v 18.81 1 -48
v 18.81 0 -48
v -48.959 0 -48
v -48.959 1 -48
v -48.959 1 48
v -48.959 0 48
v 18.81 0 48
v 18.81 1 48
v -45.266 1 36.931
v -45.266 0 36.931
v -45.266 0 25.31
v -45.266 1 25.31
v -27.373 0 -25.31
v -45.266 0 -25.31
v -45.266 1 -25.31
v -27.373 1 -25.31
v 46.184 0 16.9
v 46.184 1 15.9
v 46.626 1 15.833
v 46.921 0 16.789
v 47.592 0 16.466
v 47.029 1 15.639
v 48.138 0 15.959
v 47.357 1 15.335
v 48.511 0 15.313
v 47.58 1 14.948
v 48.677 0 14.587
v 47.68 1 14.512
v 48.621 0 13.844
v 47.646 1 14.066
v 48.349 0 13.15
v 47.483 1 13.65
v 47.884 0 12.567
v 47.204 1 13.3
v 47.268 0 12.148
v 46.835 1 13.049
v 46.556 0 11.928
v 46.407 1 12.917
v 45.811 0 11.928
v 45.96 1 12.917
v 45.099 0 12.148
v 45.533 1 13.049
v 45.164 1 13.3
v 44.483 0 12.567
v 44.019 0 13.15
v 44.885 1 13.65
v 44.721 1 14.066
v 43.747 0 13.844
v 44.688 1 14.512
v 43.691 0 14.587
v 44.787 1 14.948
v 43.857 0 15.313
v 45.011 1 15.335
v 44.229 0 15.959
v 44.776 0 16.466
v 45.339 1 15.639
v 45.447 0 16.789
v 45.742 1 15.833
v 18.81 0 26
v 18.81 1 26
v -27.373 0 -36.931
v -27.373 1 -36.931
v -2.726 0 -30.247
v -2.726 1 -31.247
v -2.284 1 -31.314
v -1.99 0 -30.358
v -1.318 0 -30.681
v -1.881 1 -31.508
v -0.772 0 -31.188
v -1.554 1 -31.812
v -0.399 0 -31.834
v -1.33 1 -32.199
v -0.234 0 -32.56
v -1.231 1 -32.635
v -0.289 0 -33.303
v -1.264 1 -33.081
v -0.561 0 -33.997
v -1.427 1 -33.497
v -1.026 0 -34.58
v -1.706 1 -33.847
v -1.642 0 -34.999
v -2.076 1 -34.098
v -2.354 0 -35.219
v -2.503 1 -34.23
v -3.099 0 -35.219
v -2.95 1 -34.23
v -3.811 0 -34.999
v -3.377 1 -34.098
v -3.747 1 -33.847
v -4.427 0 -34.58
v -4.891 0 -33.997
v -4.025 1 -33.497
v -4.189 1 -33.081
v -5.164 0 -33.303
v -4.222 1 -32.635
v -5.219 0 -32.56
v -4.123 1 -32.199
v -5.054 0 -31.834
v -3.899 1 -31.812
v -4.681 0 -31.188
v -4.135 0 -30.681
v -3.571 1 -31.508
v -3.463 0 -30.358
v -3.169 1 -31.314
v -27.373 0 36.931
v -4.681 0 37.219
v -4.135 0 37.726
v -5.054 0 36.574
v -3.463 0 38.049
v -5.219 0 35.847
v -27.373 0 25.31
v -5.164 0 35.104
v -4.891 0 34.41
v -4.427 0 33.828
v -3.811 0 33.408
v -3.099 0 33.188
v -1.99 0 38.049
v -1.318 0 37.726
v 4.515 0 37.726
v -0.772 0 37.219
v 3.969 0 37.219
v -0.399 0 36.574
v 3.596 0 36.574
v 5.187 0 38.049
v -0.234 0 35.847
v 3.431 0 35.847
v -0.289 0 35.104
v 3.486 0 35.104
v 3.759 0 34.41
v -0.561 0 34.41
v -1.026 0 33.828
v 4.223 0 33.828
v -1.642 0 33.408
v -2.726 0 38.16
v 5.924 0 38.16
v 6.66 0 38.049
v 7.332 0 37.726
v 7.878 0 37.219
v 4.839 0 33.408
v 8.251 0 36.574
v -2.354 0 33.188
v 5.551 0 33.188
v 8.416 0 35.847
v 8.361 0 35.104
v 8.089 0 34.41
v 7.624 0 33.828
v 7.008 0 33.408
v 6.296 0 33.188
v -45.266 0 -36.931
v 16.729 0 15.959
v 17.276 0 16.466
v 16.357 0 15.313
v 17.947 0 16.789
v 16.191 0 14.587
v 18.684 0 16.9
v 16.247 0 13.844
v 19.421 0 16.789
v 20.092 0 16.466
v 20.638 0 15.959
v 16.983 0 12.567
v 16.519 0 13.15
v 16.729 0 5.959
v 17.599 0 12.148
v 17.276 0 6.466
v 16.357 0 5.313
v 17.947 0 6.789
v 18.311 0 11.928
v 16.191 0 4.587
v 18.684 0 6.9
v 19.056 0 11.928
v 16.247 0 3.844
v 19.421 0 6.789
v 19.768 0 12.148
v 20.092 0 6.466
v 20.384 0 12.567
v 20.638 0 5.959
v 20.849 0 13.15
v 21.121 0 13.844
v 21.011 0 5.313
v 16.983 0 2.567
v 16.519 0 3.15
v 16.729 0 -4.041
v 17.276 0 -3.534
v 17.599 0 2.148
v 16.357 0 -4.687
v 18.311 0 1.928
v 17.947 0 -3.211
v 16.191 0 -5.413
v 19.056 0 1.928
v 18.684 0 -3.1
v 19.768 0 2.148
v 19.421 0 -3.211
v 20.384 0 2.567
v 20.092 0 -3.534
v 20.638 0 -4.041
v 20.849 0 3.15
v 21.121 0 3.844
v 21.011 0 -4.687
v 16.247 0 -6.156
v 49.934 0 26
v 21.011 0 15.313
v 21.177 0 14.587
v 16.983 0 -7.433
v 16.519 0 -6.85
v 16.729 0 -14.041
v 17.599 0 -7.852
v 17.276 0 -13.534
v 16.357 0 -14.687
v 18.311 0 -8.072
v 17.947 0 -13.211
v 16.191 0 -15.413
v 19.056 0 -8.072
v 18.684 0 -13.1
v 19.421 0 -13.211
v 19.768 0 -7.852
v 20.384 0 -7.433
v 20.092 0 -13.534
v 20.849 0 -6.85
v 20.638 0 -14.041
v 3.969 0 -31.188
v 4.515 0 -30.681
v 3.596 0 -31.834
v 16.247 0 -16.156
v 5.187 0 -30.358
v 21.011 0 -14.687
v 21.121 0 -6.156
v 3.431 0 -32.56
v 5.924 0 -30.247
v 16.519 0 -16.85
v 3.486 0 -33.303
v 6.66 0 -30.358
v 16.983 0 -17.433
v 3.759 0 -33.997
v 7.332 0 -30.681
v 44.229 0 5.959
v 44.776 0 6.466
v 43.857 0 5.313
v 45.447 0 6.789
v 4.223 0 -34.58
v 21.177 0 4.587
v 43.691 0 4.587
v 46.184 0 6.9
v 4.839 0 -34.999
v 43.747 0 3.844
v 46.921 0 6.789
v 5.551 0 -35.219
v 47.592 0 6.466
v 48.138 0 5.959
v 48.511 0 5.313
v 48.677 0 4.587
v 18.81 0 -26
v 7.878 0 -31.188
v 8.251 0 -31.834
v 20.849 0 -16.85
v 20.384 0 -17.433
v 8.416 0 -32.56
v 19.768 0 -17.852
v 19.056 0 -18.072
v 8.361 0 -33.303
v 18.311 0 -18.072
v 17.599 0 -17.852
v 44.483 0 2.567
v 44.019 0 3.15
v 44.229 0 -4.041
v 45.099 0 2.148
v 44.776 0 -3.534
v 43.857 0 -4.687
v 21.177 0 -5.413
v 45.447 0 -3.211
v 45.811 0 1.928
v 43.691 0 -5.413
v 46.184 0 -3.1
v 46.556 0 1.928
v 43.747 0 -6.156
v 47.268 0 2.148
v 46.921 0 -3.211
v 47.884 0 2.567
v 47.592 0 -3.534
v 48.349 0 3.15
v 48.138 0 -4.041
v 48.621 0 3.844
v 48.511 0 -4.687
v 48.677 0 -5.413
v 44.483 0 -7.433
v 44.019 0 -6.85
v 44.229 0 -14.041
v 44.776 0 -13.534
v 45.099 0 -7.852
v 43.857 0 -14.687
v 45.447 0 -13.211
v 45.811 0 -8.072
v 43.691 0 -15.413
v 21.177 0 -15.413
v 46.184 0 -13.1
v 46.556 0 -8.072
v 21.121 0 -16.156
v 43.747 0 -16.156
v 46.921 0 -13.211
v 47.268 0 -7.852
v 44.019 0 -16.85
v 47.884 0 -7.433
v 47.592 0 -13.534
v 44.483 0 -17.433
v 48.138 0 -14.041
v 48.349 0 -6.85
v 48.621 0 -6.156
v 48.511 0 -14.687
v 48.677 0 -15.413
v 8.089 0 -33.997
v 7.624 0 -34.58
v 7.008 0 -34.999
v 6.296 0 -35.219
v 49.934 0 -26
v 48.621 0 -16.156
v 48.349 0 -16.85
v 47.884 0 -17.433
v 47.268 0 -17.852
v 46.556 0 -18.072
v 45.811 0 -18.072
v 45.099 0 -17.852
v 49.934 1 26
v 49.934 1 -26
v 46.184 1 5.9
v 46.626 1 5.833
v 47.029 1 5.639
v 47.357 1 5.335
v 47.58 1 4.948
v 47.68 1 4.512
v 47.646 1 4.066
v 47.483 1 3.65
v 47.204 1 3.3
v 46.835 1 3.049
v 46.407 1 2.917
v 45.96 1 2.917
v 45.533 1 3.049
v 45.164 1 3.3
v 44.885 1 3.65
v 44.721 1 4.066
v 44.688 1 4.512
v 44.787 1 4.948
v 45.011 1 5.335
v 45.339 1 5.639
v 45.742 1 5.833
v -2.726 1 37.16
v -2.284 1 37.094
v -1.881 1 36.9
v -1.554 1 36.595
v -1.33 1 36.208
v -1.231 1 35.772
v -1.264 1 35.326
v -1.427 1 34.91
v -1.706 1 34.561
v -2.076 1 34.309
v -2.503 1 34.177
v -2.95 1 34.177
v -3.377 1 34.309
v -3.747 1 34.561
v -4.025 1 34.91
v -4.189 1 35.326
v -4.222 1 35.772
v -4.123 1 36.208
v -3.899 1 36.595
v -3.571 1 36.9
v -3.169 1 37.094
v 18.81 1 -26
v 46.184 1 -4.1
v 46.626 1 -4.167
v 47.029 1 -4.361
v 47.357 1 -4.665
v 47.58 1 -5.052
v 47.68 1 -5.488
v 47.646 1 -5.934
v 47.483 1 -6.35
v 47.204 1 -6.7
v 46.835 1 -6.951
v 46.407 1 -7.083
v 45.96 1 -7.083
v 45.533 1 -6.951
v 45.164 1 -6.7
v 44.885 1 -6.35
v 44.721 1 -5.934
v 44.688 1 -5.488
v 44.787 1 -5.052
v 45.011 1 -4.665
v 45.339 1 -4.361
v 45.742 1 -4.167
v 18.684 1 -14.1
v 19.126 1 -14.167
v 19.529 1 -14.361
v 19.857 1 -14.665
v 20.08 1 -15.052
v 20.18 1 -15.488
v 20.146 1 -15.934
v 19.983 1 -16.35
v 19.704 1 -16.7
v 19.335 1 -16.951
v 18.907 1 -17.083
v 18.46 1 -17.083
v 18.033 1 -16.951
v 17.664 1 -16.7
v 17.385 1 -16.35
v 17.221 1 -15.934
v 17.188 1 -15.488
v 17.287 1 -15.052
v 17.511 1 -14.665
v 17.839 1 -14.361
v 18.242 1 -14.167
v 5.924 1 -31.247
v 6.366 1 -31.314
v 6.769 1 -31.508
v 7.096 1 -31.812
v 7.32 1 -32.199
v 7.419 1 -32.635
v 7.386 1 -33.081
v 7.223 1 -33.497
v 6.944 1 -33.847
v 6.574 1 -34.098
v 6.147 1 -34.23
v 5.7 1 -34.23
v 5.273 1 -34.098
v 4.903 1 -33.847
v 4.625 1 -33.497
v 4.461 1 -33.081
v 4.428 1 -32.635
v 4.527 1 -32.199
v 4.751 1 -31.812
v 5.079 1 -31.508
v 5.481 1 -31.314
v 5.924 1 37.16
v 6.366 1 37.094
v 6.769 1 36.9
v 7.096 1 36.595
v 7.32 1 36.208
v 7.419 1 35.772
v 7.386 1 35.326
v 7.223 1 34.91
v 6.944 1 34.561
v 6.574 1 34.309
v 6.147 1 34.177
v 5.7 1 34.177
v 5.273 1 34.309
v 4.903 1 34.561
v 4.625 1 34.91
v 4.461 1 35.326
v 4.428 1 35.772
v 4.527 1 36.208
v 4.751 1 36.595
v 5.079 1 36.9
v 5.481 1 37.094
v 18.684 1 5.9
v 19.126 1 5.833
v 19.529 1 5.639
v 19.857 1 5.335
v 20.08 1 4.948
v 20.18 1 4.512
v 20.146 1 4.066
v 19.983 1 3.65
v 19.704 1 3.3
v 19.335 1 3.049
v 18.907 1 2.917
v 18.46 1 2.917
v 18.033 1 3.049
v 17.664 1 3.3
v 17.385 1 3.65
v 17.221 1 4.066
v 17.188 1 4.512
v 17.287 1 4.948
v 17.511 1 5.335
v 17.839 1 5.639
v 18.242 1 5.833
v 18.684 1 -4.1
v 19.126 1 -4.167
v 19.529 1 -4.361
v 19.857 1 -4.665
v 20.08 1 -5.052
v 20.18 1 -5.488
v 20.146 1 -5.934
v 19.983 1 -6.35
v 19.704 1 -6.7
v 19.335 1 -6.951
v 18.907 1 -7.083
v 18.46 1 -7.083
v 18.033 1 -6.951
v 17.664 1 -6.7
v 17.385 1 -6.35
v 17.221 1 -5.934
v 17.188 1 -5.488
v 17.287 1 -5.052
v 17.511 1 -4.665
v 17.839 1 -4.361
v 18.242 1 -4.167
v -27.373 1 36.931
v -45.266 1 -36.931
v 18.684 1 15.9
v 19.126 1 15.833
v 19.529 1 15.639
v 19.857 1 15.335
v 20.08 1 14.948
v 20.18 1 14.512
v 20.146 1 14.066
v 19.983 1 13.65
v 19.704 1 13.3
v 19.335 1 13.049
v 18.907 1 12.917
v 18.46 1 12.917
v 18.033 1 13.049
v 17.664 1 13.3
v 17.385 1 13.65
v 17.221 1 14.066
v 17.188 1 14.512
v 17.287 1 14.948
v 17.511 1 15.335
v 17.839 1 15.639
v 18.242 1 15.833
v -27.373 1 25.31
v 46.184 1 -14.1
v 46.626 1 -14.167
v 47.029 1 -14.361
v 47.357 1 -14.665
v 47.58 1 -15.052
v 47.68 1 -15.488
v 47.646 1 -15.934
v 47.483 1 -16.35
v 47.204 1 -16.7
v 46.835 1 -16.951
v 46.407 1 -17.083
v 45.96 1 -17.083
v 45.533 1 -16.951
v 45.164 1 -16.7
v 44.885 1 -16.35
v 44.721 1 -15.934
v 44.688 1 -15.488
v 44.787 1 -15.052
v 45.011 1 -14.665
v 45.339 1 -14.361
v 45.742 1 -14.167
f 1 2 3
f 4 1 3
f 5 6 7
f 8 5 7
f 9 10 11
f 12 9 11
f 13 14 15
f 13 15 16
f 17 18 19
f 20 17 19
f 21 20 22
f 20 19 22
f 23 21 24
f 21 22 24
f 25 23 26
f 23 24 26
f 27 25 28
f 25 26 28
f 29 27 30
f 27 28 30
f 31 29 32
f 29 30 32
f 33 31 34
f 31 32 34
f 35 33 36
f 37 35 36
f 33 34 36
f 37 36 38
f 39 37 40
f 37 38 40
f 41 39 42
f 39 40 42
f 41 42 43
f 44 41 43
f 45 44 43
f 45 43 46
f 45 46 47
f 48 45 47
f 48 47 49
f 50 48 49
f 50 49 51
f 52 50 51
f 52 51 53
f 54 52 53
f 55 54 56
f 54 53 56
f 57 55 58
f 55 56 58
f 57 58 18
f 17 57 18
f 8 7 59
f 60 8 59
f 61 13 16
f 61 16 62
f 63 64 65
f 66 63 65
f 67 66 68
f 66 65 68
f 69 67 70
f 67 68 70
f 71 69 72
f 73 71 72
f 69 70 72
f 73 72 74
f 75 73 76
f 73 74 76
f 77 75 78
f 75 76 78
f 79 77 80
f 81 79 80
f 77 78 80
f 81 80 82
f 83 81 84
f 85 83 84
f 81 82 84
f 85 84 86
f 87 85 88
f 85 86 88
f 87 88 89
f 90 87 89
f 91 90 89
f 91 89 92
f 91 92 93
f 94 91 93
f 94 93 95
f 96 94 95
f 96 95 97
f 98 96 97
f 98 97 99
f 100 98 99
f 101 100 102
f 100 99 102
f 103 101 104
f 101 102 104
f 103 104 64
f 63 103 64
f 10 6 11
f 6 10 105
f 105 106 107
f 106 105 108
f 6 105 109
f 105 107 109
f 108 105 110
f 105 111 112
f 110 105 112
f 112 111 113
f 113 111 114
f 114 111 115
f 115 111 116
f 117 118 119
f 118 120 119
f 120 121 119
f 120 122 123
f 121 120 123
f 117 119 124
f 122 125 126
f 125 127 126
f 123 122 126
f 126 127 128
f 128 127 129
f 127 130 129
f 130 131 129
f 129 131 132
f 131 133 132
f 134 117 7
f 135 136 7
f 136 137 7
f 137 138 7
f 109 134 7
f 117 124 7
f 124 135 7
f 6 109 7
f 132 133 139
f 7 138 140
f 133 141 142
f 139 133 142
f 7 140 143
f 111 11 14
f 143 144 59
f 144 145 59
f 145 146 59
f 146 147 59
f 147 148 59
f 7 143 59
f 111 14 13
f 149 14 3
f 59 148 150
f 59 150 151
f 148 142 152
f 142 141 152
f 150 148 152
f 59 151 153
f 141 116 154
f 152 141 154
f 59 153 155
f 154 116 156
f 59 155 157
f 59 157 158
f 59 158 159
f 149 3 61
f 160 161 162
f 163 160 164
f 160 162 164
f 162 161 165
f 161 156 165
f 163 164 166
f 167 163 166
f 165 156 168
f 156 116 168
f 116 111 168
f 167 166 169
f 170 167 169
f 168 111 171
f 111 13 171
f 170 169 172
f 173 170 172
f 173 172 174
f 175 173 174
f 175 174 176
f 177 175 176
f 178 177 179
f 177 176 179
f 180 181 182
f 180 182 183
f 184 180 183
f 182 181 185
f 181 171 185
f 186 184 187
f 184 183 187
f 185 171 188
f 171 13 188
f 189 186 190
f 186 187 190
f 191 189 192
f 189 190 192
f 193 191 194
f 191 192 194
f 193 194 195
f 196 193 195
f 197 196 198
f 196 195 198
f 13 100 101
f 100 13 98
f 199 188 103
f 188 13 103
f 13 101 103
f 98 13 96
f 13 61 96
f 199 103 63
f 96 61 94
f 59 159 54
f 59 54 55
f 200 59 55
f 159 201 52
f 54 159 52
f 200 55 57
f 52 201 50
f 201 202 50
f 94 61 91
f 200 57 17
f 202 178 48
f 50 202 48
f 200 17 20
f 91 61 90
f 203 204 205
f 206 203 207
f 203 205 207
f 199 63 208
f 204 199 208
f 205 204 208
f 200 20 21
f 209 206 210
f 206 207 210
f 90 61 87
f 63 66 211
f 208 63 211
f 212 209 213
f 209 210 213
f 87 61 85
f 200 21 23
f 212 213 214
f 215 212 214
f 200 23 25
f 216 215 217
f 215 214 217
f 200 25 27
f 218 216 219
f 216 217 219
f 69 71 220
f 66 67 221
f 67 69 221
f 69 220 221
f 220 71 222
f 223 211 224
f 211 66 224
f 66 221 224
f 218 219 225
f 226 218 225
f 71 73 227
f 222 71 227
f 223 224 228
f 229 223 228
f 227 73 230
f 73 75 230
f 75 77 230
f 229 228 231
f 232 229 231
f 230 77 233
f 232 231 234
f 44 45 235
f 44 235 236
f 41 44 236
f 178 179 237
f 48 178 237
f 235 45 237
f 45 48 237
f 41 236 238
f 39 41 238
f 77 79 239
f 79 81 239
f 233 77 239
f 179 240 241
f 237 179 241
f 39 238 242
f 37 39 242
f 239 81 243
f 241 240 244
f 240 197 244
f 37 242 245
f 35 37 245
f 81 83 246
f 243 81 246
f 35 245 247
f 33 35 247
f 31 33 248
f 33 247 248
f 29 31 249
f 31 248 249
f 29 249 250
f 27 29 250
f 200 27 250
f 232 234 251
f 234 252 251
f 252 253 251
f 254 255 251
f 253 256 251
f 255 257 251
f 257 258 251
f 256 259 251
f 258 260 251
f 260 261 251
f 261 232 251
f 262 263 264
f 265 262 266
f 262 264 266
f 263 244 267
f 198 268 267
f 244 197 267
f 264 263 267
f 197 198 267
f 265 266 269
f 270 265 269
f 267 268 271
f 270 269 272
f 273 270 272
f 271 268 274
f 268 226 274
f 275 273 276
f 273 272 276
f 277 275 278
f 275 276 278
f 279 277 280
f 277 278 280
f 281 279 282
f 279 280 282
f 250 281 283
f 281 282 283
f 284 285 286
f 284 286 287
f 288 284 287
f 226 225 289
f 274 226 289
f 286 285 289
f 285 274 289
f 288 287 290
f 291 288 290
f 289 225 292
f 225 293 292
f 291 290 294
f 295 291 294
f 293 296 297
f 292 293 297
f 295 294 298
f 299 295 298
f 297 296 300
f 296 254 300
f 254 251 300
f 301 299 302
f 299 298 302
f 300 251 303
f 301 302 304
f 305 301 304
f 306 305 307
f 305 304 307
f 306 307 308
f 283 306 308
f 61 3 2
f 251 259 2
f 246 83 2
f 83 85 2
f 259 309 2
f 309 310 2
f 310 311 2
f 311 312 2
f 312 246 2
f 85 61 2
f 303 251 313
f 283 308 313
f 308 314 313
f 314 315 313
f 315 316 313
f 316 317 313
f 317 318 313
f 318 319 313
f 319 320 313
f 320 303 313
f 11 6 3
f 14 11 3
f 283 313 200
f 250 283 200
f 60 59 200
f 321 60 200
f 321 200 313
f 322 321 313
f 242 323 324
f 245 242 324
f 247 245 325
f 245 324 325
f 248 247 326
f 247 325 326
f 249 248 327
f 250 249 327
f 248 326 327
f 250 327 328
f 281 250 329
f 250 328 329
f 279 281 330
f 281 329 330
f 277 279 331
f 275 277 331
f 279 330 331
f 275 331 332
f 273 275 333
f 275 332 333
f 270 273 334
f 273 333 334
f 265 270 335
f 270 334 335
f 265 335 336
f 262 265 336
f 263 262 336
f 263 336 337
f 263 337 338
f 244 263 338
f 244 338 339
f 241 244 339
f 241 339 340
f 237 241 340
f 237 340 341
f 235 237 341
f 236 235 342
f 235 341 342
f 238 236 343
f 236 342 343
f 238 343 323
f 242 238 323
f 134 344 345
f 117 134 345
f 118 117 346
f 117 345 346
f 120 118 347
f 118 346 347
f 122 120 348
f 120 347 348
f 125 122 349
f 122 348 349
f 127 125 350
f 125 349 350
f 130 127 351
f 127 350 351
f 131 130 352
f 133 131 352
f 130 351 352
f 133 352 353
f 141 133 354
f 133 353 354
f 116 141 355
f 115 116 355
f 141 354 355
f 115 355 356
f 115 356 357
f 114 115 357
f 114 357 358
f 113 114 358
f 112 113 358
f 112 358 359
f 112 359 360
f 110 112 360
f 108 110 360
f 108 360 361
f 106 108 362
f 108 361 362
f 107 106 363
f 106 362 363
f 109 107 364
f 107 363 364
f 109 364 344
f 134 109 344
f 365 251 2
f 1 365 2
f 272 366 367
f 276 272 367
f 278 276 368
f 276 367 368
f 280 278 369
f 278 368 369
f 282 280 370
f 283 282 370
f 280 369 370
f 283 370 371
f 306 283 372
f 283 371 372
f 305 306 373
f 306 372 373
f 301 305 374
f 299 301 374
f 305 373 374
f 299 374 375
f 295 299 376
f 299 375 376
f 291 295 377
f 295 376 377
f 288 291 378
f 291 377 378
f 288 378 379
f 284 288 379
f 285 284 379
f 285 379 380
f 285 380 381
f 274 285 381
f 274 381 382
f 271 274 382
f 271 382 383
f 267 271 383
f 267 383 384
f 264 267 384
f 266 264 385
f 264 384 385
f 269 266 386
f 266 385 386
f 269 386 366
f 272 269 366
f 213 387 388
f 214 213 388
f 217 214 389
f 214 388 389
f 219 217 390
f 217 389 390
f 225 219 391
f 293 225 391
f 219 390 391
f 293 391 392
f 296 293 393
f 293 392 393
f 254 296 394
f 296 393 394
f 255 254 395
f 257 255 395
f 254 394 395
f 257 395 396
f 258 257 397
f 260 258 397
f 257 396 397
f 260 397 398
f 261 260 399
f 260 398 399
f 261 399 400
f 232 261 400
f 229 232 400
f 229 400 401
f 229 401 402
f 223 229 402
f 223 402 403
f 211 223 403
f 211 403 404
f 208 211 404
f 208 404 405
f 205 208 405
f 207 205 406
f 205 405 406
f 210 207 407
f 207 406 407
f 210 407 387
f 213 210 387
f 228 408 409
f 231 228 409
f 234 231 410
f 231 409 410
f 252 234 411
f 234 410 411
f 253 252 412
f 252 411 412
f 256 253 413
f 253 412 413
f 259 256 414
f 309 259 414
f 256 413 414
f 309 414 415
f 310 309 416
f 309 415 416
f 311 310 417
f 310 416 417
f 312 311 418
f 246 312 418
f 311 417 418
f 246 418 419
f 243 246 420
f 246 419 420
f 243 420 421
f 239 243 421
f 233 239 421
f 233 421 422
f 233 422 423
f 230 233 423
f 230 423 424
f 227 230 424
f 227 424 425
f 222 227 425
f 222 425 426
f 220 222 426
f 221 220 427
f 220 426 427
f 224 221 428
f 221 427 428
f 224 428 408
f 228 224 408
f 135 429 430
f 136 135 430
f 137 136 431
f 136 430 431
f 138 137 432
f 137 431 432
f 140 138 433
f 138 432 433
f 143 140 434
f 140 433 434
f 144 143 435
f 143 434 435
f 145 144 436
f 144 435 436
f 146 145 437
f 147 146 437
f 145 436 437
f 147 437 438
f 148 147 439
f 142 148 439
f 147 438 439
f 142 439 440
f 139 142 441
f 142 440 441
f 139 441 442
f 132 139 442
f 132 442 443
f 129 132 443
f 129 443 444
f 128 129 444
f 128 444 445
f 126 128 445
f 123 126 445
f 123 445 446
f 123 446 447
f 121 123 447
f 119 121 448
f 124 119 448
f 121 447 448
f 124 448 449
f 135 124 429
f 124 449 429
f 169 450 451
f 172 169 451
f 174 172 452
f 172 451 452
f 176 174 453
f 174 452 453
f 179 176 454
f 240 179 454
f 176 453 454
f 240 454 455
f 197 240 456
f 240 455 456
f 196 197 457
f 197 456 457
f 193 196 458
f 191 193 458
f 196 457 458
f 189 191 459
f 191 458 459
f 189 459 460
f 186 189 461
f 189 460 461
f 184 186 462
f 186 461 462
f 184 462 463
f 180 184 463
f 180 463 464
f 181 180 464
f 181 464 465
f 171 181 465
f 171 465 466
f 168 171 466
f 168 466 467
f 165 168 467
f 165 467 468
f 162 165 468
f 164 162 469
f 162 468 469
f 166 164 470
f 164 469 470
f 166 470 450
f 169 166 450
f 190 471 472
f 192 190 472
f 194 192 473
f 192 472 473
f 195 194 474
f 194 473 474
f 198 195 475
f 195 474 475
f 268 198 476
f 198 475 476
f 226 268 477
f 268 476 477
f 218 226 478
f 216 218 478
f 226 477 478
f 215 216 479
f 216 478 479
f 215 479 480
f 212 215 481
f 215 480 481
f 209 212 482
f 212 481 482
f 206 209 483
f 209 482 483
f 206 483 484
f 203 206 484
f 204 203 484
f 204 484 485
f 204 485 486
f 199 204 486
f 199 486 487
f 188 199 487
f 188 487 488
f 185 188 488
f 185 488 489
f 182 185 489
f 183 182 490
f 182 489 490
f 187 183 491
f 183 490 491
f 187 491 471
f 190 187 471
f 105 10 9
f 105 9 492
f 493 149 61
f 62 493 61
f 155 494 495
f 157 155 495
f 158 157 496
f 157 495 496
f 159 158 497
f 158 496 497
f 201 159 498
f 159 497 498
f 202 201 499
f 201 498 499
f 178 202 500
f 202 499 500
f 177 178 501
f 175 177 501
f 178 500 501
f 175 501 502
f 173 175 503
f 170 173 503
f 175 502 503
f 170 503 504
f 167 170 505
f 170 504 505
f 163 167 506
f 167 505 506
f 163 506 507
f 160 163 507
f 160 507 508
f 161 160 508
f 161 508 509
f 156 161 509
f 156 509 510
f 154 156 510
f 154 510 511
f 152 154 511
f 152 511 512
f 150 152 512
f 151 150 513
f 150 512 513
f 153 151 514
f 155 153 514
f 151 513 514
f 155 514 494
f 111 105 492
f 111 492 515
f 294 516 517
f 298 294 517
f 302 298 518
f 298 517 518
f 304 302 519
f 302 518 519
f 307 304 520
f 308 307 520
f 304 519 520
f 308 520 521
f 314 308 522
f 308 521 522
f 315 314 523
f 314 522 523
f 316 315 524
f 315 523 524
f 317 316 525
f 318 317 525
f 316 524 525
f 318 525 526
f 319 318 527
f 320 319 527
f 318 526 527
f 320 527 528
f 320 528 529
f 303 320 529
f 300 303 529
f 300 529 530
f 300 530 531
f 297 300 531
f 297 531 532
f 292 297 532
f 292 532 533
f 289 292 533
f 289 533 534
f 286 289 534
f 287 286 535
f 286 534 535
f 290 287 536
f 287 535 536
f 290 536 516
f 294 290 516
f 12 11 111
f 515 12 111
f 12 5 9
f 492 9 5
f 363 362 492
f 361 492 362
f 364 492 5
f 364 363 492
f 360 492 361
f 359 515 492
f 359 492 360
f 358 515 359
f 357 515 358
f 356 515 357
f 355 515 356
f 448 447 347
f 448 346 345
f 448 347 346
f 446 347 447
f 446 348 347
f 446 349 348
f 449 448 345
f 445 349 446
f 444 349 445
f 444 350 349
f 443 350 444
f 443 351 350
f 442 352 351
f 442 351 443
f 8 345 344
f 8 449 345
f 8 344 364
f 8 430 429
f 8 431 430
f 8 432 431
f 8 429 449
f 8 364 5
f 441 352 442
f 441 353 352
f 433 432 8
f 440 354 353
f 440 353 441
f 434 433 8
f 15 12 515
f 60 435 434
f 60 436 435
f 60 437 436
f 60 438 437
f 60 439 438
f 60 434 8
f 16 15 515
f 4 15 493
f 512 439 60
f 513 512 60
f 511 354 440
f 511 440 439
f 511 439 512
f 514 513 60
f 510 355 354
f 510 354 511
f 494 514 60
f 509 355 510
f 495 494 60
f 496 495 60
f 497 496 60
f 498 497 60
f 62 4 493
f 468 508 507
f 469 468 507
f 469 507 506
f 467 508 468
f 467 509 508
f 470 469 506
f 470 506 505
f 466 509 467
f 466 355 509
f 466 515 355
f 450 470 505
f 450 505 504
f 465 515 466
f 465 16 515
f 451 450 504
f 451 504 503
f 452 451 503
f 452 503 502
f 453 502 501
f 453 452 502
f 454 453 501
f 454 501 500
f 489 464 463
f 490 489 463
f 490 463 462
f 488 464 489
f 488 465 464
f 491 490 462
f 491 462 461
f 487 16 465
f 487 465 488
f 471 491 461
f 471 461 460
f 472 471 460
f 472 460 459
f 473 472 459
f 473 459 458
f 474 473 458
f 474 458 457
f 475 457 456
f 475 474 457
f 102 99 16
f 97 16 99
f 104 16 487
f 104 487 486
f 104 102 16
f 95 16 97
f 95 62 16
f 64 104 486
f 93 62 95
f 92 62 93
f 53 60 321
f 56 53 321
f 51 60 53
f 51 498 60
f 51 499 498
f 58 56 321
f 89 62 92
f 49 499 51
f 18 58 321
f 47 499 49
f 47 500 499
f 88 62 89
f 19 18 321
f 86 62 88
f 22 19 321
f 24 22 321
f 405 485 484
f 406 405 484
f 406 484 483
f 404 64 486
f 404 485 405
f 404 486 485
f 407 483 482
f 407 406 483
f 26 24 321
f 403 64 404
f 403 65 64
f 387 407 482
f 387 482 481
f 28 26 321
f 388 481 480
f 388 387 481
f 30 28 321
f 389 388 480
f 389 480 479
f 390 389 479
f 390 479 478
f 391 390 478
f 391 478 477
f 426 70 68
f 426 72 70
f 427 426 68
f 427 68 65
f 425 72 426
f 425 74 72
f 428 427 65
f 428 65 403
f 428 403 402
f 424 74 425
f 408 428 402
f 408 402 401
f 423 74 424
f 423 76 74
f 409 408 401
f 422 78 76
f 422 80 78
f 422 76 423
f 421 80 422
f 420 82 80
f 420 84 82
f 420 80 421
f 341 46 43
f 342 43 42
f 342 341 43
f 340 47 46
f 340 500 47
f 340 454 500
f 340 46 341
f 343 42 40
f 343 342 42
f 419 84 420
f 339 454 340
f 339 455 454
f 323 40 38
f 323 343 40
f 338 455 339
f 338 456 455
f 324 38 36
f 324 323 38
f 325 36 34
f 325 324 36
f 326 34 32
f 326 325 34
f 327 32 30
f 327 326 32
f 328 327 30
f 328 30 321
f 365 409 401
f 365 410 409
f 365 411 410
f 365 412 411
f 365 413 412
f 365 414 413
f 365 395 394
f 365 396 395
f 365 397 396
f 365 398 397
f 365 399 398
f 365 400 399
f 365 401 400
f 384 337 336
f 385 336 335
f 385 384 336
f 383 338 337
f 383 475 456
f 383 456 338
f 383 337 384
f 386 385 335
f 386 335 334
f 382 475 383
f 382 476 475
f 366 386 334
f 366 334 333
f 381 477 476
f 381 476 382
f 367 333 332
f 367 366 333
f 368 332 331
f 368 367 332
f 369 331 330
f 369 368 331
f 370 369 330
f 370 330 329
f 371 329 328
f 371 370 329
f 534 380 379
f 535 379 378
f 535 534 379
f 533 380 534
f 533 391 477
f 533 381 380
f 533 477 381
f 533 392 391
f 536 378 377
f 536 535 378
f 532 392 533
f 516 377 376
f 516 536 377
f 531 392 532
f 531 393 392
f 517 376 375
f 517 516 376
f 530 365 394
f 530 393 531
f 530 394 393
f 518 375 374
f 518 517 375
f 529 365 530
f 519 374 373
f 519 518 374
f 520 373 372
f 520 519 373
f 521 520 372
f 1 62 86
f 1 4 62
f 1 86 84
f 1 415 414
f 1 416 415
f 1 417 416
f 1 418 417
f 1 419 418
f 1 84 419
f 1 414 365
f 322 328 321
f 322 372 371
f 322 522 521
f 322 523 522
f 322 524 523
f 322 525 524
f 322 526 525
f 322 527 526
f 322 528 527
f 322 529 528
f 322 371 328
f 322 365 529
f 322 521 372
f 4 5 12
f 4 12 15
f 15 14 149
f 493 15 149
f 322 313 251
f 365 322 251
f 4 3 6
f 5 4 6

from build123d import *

# Parameters (mm, degrees)
SKETCH_1_W          = 17.893001423
SKETCH_1_H          = 11.620982588
SKETCH_1_H_2        = 11.620982589
EXTRUDE_1_DEPTH     = 1
SKETCH_2_R          = 1.5
CUT_EXTRUDE_1_DEPTH = 10
CHAMFER_1_SIZE      = 1
SKETCH_3_R          = 1.5
CUT_EXTRUDE_2_DEPTH = 10
CHAMFER_2_SIZE      = 1


with BuildPart() as part:
    # Эскиз1 → Бобышка-Вытянуть1 (new body)
    with BuildSketch(Plane(origin=(0, 0, 0), x_dir=(1, 0, 0), z_dir=(0, 1, 0))):
        Polygon((49.933797981, 26), (18.809932441, 26), (18.809932441, 48), (15, 48), (-48.959081244, 48), (-48.959081244, -48), (15, -48), (18.809932441, -48), (18.809932441, -26), (49.933797981, -26), align=None)
        with Locations((-36.319088007, -31.12001489)):
            Rectangle(SKETCH_1_W, SKETCH_1_H, mode=Mode.SUBTRACT)
        with Locations((-36.319088007, 31.12001489)):
            Rectangle(SKETCH_1_W, SKETCH_1_H_2, mode=Mode.SUBTRACT)
    extrude(amount=EXTRUDE_1_DEPTH)

    # Эскиз2 → Вырез-Вытянуть1 (cut)
    with BuildSketch(Plane(origin=(0, 1, 0), x_dir=(1, 0, 0), z_dir=(0, 1, 0))):
        with Locations(Location((46.183797981, -14.4, 0), (0, 0, 270))):
            Circle(SKETCH_2_R)
        with Locations(Location((18.683797981, -14.4, 0), (0, 0, 270))):
            Circle(SKETCH_2_R)
        with Locations(Location((18.683797981, -4.4, 0), (0, 0, 270))):
            Circle(SKETCH_2_R)
        with Locations(Location((46.183797981, -4.4, 0), (0, 0, 270))):
            Circle(SKETCH_2_R)
        with Locations(Location((18.683797981, 5.6, 0), (0, 0, 270))):
            Circle(SKETCH_2_R)
        with Locations(Location((46.183797981, 5.6, 0), (0, 0, 270))):
            Circle(SKETCH_2_R)
        with Locations(Location((18.683797981, 15.6, 0), (0, 0, 270))):
            Circle(SKETCH_2_R)
        with Locations(Location((46.183797981, 15.6, 0), (0, 0, 270))):
            Circle(SKETCH_2_R)
    extrude(amount=-CUT_EXTRUDE_1_DEPTH, mode=Mode.SUBTRACT)

    # Фаска1
    chamfer_1_edges = [part.edges().sort_by_distance(p)[0] for p in [
        (46.183797981, 0, -7.1),
        (18.683797981, 0, 2.9),
        (46.183797981, 0, 2.9),
        (18.683797981, 0, 12.9),
        (18.683797981, 0, -17.1),
        (46.183797981, 0, -17.1),
        (18.683797981, 0, -7.1),
        (46.183797981, 0, 12.9),
    ]]
    chamfer(chamfer_1_edges, length=CHAMFER_1_SIZE - 0.0001)  # a hair under: the kernel refuses the full size

    # Эскиз3 → Вырез-Вытянуть2 (cut)
    with BuildSketch(Plane(origin=(0, 1, 0), x_dir=(1, 0, 0), z_dir=(0, 1, 0))):
        with Locations(Location((5.923569009, 32.746976788, 0), (0, 0, 270))):
            Circle(SKETCH_3_R)
        with Locations(Location((-2.726430991, 32.746976788, 0), (0, 0, 270))):
            Circle(SKETCH_3_R)
        with Locations(Location((-2.726430991, -35.660220789, 0), (0, 0, 270))):
            Circle(SKETCH_3_R)
        with Locations(Location((5.923569009, -35.660220789, 0), (0, 0, 270))):
            Circle(SKETCH_3_R)
    extrude(amount=-CUT_EXTRUDE_2_DEPTH, mode=Mode.SUBTRACT)

    # Фаска2
    chamfer_2_edges = [part.edges().sort_by_distance(p)[0] for p in [
        (5.923569009, 0, 34.160220789),
        (-2.726430991, 0, 34.160220789),
        (-2.726430991, 0, -34.246976788),
        (5.923569009, 0, -34.246976788),
    ]]
    chamfer(chamfer_2_edges, length=CHAMFER_2_SIZE - 0.0001)  # a hair under: the kernel refuses the full size


solid = part.part
